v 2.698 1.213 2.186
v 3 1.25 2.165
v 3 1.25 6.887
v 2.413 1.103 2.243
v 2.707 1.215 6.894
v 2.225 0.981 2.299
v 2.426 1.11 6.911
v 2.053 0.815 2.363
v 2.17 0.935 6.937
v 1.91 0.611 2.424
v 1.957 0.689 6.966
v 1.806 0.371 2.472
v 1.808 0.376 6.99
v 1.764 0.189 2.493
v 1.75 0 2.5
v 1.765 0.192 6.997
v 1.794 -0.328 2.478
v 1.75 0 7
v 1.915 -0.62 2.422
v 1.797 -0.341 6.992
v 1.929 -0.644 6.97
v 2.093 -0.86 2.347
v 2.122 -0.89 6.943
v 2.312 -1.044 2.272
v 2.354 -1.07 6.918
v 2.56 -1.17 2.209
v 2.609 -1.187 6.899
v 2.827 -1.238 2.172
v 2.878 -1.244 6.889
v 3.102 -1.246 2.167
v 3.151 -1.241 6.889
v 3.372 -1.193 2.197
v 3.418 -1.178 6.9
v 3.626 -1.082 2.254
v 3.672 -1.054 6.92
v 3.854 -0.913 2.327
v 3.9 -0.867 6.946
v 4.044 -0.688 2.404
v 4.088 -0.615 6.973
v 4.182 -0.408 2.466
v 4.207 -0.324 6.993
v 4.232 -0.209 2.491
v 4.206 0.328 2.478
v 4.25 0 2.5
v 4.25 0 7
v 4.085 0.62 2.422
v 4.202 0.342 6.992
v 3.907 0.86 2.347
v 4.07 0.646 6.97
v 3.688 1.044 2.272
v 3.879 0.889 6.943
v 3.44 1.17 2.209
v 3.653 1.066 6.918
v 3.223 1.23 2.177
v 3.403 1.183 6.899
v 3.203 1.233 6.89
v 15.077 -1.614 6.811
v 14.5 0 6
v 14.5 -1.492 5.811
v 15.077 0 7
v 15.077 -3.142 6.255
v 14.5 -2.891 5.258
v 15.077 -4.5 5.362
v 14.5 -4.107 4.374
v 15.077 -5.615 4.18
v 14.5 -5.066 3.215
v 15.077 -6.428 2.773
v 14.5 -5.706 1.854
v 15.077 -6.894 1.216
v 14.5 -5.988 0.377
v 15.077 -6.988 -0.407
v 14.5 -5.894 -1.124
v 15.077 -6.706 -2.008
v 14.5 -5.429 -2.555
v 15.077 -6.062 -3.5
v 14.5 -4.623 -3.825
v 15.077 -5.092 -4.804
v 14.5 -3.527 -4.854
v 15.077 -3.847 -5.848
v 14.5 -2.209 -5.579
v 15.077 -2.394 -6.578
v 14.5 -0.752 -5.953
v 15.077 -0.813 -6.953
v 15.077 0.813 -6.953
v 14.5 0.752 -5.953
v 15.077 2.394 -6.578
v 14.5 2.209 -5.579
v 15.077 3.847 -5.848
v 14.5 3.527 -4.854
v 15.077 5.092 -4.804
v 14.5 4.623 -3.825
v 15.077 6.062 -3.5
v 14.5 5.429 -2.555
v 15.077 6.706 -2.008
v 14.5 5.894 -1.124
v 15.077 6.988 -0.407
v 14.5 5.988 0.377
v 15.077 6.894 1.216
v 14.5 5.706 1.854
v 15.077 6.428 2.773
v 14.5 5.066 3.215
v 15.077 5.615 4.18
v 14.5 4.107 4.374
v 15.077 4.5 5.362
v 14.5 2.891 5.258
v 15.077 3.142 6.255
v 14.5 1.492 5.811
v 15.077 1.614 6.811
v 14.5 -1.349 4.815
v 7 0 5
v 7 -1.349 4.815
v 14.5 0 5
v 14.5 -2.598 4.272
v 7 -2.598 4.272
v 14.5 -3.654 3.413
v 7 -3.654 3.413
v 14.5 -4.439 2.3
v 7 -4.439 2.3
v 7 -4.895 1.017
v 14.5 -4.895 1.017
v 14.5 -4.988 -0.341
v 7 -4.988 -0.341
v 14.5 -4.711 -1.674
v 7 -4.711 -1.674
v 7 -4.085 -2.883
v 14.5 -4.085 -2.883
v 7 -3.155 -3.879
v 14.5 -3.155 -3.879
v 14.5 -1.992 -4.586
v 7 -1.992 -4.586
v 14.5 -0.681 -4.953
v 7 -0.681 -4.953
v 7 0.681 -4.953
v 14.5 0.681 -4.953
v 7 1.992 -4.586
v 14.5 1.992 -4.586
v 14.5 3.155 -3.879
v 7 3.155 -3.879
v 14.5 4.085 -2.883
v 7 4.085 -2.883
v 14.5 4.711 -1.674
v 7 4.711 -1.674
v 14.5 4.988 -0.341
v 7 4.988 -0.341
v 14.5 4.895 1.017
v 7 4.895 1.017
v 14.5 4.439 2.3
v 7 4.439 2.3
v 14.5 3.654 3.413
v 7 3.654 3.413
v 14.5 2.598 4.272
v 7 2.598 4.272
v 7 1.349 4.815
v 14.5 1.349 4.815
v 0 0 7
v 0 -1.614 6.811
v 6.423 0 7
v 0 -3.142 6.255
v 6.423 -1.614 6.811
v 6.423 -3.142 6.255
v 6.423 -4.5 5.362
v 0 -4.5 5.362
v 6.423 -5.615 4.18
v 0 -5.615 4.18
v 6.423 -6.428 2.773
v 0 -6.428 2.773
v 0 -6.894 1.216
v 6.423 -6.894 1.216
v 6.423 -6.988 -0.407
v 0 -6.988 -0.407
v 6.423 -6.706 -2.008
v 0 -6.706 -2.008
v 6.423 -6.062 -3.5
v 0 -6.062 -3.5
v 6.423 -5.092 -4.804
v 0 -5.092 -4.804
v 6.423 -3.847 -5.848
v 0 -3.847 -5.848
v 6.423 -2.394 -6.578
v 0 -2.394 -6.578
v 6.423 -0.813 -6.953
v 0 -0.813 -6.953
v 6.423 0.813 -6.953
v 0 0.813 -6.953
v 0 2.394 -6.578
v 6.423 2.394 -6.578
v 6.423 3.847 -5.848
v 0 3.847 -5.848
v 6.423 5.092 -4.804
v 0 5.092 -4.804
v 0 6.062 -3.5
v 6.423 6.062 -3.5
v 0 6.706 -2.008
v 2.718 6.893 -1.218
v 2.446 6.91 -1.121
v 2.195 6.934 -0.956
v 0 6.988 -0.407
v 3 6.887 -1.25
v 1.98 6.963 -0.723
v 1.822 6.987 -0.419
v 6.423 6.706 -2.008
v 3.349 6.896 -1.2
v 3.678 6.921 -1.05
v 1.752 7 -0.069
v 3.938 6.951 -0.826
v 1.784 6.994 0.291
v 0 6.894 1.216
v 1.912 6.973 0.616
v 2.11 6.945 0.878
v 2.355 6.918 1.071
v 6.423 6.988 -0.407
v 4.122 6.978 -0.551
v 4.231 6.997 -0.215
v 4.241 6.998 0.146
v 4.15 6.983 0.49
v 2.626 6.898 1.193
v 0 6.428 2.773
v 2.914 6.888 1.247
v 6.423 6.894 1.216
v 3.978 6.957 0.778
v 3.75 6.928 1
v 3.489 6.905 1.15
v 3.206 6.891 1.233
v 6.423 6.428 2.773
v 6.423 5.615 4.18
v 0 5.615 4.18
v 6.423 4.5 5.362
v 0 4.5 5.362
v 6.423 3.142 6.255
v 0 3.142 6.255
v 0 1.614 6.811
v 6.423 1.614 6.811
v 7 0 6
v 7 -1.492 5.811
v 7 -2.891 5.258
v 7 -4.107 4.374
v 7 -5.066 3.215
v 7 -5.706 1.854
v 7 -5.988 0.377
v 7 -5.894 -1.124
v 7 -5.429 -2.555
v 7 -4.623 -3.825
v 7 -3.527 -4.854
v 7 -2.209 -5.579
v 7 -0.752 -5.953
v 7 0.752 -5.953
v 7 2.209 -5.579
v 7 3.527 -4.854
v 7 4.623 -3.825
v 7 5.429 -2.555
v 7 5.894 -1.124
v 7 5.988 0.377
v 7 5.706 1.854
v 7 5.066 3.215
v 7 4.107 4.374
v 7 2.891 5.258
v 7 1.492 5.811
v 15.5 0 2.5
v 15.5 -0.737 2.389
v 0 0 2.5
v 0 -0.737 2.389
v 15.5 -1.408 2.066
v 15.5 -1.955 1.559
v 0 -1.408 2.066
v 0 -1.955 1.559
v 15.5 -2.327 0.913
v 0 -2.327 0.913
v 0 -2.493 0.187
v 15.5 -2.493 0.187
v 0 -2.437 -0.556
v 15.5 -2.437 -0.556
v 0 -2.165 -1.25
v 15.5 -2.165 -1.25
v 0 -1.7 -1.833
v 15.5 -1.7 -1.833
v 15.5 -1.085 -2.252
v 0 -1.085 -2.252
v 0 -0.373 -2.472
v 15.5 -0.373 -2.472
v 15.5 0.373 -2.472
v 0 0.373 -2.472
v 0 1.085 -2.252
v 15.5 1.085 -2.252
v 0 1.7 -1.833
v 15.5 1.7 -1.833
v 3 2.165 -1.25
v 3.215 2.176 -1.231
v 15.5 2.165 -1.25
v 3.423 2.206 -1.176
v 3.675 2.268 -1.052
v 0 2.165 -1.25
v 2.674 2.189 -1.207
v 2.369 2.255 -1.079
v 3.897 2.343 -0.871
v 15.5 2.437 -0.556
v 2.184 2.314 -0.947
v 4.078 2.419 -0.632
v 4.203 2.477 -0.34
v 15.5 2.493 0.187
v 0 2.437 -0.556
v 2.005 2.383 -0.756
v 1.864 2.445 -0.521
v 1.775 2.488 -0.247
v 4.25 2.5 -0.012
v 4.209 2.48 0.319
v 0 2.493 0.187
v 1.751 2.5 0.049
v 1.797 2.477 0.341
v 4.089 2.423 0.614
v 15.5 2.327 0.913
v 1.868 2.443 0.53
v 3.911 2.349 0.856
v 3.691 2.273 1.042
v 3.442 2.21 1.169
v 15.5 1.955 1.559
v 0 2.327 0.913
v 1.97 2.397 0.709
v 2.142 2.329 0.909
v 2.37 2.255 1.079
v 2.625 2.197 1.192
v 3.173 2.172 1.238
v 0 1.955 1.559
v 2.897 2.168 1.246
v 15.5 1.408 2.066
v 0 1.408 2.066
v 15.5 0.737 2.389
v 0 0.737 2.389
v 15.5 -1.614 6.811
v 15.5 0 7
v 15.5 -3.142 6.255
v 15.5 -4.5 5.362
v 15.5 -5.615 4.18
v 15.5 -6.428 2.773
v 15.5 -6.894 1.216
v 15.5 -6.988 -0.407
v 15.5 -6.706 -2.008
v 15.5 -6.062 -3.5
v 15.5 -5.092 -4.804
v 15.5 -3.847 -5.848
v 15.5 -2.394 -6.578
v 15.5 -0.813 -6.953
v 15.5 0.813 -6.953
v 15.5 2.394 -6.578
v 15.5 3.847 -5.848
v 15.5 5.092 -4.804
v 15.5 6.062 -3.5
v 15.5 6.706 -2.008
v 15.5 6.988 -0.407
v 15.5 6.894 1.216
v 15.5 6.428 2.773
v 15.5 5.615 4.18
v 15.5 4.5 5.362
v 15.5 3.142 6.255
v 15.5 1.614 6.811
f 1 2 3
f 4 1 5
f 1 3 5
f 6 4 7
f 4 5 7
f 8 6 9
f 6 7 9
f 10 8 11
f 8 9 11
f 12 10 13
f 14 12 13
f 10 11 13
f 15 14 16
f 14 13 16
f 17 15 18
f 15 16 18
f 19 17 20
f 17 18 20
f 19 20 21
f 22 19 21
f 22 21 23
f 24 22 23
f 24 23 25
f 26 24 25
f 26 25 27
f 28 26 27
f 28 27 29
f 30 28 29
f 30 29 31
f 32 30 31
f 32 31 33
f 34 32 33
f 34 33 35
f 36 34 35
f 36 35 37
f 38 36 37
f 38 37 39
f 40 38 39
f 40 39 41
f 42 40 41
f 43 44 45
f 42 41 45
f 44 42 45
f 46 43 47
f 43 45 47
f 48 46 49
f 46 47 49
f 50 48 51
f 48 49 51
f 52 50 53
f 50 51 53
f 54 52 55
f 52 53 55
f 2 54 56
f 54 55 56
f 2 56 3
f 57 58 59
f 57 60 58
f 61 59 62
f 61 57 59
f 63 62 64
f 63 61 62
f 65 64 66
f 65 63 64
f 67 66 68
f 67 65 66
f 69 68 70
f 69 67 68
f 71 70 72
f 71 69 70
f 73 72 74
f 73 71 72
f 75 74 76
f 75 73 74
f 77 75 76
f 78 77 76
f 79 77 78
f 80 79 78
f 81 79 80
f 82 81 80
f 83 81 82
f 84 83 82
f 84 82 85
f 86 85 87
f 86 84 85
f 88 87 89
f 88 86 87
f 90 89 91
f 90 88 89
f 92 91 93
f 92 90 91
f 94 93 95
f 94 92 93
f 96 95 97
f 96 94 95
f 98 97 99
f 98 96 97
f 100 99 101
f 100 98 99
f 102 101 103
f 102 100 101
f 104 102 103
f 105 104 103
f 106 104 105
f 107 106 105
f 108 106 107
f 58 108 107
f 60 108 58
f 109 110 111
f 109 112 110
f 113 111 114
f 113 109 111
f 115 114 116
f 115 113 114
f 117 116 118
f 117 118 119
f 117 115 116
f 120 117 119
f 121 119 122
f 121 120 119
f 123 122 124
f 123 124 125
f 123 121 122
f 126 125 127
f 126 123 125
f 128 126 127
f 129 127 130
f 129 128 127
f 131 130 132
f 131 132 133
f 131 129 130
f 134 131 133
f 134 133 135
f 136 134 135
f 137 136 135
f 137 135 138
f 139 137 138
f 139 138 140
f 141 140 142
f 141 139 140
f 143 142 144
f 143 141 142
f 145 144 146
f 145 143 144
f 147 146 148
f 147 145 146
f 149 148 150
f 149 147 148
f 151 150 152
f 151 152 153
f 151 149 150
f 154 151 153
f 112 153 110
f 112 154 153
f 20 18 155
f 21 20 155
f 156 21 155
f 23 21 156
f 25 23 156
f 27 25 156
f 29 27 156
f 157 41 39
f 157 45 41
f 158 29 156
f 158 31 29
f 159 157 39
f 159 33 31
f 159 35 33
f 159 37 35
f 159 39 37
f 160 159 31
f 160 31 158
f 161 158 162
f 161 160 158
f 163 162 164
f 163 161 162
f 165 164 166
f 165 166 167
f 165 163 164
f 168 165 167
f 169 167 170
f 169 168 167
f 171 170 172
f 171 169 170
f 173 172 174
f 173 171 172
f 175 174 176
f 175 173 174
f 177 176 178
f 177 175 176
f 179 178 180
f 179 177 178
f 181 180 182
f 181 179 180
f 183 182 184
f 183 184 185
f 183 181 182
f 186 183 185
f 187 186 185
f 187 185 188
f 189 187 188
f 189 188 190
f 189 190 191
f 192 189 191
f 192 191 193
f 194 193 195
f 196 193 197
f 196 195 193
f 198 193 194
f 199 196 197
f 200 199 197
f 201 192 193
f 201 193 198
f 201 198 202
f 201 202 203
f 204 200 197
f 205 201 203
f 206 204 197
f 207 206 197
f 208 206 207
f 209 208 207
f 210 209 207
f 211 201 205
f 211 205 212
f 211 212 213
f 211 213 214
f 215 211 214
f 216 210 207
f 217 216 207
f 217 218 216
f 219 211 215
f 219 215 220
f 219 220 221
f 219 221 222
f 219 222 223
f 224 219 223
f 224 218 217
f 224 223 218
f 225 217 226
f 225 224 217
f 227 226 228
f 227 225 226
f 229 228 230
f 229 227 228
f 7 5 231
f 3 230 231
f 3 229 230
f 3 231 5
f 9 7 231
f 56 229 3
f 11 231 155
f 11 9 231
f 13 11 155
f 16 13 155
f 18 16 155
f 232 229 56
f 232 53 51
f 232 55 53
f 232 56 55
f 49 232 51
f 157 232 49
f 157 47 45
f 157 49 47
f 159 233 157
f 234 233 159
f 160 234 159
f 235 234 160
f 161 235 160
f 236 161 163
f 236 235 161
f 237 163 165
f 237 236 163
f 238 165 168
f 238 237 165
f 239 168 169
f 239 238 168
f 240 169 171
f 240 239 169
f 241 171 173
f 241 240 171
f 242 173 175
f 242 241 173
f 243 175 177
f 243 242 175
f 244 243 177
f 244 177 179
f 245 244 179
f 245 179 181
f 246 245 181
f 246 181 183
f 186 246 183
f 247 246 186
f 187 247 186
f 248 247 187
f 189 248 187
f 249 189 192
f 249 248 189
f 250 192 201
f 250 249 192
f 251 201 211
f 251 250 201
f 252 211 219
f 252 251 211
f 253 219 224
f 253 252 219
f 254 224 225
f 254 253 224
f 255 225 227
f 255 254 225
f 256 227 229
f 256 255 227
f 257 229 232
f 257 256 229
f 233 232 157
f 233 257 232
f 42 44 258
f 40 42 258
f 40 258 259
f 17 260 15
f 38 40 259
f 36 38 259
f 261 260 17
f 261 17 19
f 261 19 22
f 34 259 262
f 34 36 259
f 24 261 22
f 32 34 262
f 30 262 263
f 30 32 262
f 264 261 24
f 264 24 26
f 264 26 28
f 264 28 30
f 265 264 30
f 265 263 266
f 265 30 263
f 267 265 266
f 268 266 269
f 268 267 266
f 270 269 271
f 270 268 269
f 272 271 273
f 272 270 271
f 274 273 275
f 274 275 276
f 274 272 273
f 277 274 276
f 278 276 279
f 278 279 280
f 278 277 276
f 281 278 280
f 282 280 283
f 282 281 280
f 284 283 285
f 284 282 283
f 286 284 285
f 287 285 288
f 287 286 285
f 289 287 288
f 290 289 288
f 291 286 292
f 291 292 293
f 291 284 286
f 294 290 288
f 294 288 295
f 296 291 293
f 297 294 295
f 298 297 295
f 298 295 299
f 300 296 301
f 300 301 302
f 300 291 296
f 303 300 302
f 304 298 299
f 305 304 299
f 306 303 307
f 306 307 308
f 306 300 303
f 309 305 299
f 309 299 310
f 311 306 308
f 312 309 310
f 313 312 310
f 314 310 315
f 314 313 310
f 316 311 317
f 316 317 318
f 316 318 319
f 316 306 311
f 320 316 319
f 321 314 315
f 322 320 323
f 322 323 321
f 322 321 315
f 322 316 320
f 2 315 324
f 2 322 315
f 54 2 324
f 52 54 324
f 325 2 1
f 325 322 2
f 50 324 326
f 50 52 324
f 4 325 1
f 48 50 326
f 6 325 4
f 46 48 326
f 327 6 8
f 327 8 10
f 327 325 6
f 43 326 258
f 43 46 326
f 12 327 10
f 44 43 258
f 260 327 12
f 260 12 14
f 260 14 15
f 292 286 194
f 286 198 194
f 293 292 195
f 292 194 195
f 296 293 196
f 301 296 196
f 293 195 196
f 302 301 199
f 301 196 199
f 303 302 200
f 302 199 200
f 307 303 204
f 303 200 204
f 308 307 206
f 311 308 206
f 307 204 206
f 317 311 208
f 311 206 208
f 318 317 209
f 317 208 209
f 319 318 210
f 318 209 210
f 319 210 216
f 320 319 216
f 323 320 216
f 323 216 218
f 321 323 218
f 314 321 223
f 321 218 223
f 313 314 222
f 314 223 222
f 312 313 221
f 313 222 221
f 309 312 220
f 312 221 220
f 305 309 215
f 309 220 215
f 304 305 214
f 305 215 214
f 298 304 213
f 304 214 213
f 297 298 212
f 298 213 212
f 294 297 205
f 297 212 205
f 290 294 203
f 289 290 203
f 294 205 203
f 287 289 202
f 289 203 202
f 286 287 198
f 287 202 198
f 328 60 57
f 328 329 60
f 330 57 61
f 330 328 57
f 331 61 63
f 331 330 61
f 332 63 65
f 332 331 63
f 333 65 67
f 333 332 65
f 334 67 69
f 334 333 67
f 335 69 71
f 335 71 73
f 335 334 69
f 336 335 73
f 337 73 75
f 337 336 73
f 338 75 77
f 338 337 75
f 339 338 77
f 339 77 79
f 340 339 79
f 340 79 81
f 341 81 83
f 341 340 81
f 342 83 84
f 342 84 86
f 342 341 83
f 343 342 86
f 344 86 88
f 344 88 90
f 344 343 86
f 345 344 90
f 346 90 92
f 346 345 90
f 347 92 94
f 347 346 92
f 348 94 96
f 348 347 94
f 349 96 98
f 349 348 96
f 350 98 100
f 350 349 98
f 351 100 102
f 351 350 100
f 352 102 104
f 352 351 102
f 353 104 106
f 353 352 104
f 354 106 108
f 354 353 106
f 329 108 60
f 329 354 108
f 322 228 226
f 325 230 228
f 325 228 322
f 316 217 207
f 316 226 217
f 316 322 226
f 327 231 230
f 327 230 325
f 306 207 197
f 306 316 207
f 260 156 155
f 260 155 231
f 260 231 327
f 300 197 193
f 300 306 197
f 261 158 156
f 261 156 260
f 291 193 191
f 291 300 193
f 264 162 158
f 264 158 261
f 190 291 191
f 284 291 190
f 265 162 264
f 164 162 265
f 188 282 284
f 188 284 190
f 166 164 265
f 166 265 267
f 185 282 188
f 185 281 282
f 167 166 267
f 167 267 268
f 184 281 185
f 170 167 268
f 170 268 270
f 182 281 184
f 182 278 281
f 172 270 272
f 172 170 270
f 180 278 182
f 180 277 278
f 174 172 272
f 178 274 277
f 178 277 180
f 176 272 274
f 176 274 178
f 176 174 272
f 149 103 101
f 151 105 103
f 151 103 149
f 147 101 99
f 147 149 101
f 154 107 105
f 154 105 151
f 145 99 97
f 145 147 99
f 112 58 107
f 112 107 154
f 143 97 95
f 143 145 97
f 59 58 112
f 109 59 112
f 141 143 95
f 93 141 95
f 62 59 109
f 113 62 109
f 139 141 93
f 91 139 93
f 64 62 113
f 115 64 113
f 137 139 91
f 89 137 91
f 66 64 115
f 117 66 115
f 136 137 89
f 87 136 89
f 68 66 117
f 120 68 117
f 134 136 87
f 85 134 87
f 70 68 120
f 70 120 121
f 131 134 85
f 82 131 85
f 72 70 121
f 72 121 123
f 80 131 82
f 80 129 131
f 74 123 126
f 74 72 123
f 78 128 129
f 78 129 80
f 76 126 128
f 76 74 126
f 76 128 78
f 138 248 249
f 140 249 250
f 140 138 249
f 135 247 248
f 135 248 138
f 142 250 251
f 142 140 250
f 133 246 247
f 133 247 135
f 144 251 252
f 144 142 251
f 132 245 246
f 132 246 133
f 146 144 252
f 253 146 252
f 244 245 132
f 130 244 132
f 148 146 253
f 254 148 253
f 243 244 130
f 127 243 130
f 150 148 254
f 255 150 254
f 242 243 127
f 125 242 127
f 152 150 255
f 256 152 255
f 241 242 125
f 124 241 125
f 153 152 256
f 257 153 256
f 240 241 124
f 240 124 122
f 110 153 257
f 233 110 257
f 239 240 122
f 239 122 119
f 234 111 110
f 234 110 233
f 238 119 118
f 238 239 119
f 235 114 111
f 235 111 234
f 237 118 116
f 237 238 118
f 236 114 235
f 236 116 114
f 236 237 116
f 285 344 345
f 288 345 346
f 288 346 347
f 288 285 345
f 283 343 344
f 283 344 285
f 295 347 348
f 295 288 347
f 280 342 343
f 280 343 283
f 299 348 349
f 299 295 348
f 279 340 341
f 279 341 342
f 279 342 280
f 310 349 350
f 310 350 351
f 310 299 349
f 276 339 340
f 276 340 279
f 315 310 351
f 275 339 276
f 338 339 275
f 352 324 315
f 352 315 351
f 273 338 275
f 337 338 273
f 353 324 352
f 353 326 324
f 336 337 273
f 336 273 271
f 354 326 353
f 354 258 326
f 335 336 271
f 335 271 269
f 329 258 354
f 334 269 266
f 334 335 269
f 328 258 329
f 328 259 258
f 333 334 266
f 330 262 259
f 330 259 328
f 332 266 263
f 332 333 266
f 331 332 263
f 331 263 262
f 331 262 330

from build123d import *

# Parameters (mm, degrees)
ESQUISSE2_W = 1.25
ESQUISSE2_H = 7
ESQUISSE5_W = 1.25
ESQUISSE5_H = 7


with BuildPart() as part:
    # Esquisse1 → Révolution1 (revolve)
    with BuildSketch(Plane.XY, mode=Mode.PRIVATE) as r_volution1_sk:
        Polygon((0, 2.5), (0, 7), (6.422649731, 7), (7, 6), (7, 5), (14.5, 5), (14.5, 6), (15.077350269, 7), (15.5, 7), (15.5, 2.5), align=None)
    revolve(r_volution1_sk.sketch.rotate(Axis((0, 0, 0), (1, 0, 0)), 90), axis=Axis((0, 0, 0), (1, 0, 0)))

    # Esquisse2 → Trou taraudé M31 (revolve, cut)
    with BuildSketch(Plane.YZ.offset(3)):
        with Locations((0.625, 3.5)):
            Rectangle(ESQUISSE2_W, ESQUISSE2_H)
    revolve(axis=Axis((3, 0, -6.35), (0, 0, 1)), mode=Mode.SUBTRACT)

    # Esquisse5 → Trou taraudé M32 (revolve, cut)
    with BuildSketch(Plane(origin=(3, 0, 0), x_dir=(0, 0, -1), z_dir=(1, 0, 0))):
        with Locations((0.625, 3.5)):
            Rectangle(ESQUISSE5_W, ESQUISSE5_H)
    revolve(axis=Axis((3, -6.35, 0), (0, 1, 0)), mode=Mode.SUBTRACT)


solid = part.part
